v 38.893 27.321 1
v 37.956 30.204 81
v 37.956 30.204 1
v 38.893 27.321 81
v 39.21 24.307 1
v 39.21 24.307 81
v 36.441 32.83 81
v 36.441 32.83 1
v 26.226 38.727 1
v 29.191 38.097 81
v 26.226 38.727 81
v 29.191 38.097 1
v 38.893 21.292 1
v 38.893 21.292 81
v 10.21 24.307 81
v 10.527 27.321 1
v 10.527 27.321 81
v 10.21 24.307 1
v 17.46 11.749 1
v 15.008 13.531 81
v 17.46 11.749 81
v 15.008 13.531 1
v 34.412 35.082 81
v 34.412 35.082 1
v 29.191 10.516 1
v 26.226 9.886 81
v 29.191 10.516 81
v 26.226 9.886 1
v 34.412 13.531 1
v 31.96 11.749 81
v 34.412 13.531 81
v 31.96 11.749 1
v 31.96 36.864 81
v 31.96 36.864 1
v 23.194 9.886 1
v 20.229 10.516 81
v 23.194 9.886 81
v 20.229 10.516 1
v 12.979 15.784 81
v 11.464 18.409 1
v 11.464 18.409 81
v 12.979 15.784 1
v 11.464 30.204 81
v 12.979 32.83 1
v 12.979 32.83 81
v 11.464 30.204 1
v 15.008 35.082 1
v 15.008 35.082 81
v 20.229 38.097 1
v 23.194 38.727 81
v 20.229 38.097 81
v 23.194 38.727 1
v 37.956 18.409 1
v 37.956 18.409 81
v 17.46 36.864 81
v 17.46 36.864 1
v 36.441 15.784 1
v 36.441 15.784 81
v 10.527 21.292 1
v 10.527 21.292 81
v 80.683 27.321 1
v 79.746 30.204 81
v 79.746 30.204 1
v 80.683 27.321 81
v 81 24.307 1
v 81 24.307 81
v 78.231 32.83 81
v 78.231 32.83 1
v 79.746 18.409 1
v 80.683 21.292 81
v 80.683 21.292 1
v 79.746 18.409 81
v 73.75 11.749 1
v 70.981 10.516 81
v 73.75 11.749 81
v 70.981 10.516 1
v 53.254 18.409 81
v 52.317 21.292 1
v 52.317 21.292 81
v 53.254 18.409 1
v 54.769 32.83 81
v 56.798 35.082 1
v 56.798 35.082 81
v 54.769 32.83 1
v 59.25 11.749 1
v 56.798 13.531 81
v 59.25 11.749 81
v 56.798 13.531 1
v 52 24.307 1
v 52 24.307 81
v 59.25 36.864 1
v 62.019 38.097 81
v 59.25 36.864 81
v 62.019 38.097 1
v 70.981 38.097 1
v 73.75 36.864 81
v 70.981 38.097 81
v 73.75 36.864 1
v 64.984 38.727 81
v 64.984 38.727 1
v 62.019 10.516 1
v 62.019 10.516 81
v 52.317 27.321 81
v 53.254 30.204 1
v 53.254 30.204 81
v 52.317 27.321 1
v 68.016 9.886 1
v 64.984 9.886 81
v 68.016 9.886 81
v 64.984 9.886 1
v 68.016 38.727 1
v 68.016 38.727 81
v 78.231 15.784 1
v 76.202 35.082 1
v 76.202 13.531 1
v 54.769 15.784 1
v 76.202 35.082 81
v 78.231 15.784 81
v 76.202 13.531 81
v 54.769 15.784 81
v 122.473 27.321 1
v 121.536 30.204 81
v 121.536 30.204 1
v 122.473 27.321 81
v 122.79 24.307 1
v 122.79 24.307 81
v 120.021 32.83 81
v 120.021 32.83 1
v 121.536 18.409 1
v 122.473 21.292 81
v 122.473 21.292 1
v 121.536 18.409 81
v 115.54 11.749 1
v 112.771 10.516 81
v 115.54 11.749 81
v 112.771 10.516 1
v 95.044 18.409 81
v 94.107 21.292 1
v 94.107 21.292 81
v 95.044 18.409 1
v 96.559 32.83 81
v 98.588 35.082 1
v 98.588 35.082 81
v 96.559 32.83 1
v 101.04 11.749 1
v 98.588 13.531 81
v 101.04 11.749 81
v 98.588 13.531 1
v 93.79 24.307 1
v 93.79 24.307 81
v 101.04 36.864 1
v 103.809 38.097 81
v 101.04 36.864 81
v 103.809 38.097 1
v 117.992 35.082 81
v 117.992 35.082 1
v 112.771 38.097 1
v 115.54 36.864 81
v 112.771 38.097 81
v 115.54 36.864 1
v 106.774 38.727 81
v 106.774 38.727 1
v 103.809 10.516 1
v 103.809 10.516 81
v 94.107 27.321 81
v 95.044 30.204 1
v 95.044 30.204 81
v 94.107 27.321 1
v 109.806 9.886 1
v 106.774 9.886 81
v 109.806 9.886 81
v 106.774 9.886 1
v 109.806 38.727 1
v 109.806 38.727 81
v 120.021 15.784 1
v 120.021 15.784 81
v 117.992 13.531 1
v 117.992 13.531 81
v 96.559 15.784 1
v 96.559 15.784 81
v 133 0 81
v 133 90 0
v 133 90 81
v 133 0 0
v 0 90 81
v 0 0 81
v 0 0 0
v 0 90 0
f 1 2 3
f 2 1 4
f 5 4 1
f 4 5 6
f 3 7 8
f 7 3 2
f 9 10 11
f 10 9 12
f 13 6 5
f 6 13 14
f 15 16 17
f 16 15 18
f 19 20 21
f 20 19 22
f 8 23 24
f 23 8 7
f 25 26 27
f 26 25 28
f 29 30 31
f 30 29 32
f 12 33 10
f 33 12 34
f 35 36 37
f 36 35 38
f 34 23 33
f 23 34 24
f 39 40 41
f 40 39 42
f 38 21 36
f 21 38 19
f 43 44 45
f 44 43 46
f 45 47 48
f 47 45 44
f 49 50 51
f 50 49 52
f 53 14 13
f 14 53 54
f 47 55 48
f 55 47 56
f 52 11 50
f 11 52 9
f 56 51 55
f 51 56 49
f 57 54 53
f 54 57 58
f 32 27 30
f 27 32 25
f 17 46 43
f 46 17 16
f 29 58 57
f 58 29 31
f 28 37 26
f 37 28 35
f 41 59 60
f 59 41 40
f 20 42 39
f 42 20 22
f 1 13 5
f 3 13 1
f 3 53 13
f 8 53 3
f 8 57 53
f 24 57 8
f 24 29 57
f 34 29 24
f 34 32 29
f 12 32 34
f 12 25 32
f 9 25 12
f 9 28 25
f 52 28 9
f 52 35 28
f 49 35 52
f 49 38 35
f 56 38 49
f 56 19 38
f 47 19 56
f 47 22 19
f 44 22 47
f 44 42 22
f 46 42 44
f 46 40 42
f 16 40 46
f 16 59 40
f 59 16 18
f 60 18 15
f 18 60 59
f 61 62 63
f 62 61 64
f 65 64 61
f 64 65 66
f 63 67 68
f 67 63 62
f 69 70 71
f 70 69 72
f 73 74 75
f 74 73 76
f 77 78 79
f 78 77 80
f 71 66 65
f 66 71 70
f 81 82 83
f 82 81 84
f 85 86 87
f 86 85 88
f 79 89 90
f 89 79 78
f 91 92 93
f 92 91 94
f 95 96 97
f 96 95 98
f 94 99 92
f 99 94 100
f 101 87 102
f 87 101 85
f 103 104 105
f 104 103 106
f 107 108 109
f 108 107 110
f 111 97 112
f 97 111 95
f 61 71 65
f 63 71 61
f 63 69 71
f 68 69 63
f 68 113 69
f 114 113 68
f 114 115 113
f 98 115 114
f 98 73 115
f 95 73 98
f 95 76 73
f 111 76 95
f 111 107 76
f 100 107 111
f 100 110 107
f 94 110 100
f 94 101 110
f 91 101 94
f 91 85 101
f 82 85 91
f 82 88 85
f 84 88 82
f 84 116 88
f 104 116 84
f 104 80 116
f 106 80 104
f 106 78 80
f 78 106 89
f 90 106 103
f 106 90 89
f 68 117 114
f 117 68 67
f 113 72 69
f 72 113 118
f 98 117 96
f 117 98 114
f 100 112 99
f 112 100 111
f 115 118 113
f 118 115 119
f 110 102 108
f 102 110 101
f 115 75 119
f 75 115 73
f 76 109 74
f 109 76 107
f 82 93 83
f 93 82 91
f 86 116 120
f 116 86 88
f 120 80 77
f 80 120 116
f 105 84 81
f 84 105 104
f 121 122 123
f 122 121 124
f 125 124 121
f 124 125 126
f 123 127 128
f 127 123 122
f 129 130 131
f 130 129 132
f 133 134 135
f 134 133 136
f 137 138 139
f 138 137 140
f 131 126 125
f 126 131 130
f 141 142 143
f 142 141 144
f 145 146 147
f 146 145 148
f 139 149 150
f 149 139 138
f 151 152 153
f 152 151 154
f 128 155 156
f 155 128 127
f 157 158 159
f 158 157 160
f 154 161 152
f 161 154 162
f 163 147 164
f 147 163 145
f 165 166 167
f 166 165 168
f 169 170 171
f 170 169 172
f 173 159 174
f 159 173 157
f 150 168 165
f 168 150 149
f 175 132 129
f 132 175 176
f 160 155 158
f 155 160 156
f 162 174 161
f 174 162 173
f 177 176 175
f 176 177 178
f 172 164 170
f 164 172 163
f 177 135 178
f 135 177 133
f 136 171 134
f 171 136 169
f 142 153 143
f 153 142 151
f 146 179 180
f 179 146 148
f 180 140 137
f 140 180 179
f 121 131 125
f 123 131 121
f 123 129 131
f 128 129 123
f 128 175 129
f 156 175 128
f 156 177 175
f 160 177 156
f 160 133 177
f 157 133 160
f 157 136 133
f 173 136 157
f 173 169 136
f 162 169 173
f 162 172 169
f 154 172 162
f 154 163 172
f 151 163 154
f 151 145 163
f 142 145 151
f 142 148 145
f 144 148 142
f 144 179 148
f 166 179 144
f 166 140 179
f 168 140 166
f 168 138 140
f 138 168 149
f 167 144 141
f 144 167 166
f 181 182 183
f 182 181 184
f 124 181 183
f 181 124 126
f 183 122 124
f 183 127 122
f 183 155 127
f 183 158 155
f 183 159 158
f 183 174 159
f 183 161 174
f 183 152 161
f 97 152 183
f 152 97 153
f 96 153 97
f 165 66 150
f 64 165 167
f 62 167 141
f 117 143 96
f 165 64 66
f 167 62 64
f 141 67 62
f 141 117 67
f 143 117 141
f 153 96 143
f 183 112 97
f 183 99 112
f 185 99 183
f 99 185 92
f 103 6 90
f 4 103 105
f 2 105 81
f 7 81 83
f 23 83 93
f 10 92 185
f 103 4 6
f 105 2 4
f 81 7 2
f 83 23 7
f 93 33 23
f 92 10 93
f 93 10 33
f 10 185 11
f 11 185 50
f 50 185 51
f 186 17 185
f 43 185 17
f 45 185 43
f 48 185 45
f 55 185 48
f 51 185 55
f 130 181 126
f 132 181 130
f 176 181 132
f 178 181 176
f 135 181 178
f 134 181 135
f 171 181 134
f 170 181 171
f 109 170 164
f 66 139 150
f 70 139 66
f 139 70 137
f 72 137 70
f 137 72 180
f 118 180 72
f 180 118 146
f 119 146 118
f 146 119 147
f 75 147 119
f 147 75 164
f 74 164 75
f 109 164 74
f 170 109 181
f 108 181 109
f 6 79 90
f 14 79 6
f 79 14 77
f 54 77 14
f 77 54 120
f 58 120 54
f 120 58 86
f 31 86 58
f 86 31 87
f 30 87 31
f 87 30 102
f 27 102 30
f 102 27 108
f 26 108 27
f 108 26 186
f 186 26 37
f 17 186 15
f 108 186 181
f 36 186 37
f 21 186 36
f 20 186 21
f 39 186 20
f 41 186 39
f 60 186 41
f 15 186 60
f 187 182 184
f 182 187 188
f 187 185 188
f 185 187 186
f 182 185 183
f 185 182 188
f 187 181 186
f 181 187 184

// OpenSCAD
//Shape of Tube
_shape = 1; //[1:Cylinder,2:Square,3:Pentagon,4:Hexagon,5:Heptagon,6:Octagon]

/*
//Type of Tube
tube_type = 1; //[1:50mL Falcon, 2:15mL Corning, 3:5mL Culture Tube, 4:Other]
*/

// Tube Diameter, 
_diameter = 29;

// Cap Diameter,
cap_diameter = 34.16; 

// Thickness of the base under the tubes
_base = 1;

// Height of rack, plus thickness of base
_height = 80 + _base;

// Length of rack
_length = 133;

// Width of rack
_width = 90;

// Number of tube across
_columns = 3;

// Number of tubes deep
_rows = 2;






module tube(shape, diameter, height)
{
	if(shape == 1)
	{
		cylinder(height, diameter/2, diameter/2);
	}
	if(shape == 2)
	{
		cube([diameter,diameter,height]);
	}
	if(shape == 3)
	{
		linear_extrude(height) circle(diameter/2,$fn=5);
	}
	if(shape == 4)
	{
		linear_extrude(height) circle(diameter/2,$fn=6);
	}
	if(shape == 5)
	{
		linear_extrude(height) circle(diameter/2,$fn=7);
	}
	if(shape == 6)
	{
		linear_extrude(height) circle(diameter/2,$fn=8);
	}
}

module tubeColumn(shape, diameter, height, columns, length, capDiameter)
{
	spacing = (length - (capDiameter*columns)) / (columns + 1);
	for ( x = [spacing + capDiameter/2 : capDiameter + spacing : spacing*columns + capDiameter*(columns - 1) + capDiameter/2])
	{
		translate([x,0,0])tube(shape, diameter, height);
	}
}

module tubeArray(shape, diameter, height, rows, width, columns, length, capDiameter)
{
	spacing = (width - (capDiameter*rows)) / (rows + 1);
	for ( y = [spacing + capDiameter/2 : capDiameter + spacing : spacing*rows + capDiameter*(rows - 1) + capDiameter/2])
	{
		translate([0,y,0])tubeColumn(shape, diameter, height, columns, length, capDiameter);
	}
}

module base(height, length, width)
{
	cube([length, width, height]);
}


difference() 
{
	base(_height,_length,_width);
	translate([0,0,_base])tubeArray(_shape,_diameter,_height,_rows,_width,_columns,_length,cap_diameter);
}
